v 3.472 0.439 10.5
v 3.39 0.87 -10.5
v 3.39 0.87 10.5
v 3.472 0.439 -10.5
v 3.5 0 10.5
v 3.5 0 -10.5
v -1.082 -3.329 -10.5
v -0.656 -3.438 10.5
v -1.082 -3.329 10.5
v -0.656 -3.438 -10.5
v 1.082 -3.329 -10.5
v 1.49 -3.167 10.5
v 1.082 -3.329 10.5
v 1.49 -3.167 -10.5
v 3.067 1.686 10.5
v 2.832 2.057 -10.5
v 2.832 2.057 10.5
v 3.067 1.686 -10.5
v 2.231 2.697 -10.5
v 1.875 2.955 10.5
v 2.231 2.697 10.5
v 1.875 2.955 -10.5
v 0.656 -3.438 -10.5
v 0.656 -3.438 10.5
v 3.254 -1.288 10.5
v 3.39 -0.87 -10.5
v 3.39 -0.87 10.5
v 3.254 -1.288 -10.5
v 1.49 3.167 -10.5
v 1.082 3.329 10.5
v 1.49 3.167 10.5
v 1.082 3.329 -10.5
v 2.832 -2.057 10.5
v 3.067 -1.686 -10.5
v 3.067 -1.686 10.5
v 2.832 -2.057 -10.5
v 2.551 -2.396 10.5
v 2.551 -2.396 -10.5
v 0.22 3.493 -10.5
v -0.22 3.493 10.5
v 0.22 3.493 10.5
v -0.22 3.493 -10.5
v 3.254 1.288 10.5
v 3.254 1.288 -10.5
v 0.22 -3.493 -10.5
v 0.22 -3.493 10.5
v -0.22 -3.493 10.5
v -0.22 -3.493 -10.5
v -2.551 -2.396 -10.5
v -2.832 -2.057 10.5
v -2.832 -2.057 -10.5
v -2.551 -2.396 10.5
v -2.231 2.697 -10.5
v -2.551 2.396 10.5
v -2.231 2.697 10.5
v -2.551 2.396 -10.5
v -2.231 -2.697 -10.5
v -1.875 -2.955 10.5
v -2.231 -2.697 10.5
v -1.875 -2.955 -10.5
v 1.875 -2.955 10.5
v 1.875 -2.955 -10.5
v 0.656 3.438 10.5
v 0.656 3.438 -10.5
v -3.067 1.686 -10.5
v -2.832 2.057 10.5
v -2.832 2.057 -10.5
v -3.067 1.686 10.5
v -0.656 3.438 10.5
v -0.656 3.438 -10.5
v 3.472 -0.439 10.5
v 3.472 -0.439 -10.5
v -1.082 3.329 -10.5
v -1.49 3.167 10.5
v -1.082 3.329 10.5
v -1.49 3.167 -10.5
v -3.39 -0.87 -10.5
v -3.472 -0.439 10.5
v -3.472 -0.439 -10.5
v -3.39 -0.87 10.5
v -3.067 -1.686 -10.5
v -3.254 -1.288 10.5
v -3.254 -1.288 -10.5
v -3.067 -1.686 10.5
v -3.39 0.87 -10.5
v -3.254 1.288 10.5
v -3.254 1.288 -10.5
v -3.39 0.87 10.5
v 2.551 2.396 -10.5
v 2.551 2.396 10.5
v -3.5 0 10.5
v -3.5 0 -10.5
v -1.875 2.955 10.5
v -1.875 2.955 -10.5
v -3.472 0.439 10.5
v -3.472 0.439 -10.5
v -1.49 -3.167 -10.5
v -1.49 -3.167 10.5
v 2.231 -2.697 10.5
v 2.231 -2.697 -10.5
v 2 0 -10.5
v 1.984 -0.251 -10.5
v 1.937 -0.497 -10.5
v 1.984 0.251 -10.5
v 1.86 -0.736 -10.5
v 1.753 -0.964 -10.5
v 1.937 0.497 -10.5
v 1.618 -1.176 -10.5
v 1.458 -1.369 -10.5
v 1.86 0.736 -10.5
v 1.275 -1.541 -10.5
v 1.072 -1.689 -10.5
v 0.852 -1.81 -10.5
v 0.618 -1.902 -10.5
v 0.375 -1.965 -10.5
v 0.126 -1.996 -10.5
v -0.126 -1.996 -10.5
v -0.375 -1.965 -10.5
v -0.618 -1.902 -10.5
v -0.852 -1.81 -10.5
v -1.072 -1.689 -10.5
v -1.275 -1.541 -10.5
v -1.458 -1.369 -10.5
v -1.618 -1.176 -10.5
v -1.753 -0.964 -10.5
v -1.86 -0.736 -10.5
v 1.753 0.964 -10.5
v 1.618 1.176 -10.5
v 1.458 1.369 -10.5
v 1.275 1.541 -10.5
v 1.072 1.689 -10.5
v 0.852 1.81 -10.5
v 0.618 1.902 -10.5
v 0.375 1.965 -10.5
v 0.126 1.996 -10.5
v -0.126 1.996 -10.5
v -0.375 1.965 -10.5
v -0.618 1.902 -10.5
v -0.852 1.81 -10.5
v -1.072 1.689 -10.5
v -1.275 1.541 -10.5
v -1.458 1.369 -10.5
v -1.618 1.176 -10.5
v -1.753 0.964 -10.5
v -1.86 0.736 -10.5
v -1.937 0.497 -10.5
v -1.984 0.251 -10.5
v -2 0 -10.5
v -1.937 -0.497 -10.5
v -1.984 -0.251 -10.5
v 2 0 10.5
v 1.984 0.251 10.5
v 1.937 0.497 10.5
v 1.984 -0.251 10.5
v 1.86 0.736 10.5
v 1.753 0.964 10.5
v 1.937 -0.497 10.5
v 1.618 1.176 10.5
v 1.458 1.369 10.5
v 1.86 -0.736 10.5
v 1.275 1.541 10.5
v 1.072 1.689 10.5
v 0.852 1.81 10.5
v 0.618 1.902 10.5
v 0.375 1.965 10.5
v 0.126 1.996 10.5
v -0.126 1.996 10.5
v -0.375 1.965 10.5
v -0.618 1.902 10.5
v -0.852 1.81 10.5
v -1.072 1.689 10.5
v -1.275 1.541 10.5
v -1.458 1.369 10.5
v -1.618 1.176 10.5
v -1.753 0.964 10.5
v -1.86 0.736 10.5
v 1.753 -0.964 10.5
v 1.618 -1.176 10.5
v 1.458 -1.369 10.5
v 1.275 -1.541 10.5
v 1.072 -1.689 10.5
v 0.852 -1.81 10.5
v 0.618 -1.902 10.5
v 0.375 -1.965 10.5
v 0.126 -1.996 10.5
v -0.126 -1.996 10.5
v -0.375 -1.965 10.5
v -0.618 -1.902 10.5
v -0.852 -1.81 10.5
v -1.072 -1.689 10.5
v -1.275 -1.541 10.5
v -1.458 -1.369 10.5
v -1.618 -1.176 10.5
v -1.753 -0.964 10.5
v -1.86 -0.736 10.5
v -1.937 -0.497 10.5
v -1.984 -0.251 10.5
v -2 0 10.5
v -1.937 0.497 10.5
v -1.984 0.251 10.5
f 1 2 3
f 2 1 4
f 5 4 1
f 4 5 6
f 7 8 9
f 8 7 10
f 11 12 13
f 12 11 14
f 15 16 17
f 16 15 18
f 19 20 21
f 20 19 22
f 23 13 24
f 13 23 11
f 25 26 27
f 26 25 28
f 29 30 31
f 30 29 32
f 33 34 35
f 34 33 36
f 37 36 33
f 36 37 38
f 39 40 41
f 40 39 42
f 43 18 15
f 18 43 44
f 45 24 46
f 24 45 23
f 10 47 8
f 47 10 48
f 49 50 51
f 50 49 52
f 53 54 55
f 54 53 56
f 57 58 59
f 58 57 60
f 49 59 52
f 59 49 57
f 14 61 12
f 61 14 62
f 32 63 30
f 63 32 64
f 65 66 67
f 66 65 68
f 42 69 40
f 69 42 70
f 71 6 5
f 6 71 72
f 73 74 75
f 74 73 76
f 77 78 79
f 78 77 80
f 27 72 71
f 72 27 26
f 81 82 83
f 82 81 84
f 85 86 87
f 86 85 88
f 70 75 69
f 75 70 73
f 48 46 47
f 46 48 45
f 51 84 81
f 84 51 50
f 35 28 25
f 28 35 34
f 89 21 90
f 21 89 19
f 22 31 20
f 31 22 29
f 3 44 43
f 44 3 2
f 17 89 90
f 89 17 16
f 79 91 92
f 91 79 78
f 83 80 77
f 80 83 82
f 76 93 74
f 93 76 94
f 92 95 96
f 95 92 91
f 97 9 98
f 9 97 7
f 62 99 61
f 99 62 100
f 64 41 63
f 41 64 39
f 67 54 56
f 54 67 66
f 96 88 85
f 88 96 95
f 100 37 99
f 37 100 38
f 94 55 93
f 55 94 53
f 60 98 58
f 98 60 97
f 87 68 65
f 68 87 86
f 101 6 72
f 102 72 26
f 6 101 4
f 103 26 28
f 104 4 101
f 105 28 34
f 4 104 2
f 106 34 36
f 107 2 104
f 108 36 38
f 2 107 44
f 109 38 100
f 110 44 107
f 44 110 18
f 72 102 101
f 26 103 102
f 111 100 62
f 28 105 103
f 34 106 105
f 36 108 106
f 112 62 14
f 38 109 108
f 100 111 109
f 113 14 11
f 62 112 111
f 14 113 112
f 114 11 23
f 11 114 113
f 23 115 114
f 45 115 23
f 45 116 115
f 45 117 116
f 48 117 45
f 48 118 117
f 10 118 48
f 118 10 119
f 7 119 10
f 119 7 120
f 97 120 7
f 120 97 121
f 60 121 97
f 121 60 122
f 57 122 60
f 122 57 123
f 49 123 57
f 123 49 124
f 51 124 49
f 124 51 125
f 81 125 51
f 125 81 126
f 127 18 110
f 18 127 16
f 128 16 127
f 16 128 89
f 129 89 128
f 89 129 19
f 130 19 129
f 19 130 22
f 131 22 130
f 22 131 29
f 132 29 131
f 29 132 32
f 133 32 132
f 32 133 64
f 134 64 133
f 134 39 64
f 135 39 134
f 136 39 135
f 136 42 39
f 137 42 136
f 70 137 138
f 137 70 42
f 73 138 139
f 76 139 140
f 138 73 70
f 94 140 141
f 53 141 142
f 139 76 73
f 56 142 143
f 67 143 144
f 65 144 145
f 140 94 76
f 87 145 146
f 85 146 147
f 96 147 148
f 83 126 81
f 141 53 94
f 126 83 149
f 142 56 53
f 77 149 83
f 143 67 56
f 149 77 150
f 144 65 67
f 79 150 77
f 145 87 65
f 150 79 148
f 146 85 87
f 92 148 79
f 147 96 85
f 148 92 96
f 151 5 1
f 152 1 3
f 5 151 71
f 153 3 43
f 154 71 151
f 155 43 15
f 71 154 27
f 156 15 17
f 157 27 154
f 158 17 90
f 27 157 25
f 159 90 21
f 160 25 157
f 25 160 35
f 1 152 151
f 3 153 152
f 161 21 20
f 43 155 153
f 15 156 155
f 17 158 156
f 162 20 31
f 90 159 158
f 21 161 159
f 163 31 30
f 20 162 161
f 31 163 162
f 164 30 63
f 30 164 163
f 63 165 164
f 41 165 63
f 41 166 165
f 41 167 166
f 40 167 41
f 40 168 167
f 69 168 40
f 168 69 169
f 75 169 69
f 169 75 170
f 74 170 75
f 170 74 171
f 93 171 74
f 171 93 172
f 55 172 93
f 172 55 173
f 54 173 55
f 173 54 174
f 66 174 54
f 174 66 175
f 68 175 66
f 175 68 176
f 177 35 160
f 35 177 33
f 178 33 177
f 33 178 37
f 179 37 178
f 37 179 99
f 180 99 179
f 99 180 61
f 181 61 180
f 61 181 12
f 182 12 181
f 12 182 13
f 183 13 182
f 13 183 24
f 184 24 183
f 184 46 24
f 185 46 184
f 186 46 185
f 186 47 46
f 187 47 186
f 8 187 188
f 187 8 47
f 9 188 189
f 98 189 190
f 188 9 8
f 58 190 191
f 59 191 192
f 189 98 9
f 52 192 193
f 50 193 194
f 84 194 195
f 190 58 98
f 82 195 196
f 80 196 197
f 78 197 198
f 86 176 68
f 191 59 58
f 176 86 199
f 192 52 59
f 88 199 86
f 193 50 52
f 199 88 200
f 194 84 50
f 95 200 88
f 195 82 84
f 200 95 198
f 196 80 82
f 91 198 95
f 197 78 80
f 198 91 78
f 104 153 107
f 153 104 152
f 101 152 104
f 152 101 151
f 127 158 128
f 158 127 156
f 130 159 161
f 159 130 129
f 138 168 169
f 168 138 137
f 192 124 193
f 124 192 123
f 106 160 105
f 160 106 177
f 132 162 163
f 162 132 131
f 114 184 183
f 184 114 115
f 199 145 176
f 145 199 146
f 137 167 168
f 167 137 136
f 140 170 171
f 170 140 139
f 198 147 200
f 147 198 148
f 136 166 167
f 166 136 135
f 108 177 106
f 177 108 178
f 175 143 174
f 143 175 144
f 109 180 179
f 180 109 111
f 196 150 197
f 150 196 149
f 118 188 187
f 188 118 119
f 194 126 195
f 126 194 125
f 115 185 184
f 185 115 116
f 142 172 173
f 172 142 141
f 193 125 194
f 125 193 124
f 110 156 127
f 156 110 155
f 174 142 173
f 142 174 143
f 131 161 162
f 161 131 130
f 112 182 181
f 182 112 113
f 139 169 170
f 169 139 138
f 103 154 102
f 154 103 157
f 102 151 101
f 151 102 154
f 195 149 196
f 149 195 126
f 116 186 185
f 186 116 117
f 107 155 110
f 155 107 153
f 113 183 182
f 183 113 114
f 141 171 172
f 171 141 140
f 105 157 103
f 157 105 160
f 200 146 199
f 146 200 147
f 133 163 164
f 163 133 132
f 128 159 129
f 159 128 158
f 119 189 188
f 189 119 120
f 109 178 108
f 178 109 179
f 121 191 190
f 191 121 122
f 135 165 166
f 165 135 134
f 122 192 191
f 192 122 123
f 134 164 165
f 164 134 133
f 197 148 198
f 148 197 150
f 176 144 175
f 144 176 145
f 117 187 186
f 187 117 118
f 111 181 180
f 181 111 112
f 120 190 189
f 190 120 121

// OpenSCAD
$fn = 50;


difference() {
	union() {
		translate(v = [0, 0, -10.5000000000]) {
			cylinder(h = 21, r = 3.5000000000);
		}
	}
	union() {
		translate(v = [0, 0, -100.0000000000]) {
			cylinder(h = 200, r = 2.0000000000);
		}
	}
}
